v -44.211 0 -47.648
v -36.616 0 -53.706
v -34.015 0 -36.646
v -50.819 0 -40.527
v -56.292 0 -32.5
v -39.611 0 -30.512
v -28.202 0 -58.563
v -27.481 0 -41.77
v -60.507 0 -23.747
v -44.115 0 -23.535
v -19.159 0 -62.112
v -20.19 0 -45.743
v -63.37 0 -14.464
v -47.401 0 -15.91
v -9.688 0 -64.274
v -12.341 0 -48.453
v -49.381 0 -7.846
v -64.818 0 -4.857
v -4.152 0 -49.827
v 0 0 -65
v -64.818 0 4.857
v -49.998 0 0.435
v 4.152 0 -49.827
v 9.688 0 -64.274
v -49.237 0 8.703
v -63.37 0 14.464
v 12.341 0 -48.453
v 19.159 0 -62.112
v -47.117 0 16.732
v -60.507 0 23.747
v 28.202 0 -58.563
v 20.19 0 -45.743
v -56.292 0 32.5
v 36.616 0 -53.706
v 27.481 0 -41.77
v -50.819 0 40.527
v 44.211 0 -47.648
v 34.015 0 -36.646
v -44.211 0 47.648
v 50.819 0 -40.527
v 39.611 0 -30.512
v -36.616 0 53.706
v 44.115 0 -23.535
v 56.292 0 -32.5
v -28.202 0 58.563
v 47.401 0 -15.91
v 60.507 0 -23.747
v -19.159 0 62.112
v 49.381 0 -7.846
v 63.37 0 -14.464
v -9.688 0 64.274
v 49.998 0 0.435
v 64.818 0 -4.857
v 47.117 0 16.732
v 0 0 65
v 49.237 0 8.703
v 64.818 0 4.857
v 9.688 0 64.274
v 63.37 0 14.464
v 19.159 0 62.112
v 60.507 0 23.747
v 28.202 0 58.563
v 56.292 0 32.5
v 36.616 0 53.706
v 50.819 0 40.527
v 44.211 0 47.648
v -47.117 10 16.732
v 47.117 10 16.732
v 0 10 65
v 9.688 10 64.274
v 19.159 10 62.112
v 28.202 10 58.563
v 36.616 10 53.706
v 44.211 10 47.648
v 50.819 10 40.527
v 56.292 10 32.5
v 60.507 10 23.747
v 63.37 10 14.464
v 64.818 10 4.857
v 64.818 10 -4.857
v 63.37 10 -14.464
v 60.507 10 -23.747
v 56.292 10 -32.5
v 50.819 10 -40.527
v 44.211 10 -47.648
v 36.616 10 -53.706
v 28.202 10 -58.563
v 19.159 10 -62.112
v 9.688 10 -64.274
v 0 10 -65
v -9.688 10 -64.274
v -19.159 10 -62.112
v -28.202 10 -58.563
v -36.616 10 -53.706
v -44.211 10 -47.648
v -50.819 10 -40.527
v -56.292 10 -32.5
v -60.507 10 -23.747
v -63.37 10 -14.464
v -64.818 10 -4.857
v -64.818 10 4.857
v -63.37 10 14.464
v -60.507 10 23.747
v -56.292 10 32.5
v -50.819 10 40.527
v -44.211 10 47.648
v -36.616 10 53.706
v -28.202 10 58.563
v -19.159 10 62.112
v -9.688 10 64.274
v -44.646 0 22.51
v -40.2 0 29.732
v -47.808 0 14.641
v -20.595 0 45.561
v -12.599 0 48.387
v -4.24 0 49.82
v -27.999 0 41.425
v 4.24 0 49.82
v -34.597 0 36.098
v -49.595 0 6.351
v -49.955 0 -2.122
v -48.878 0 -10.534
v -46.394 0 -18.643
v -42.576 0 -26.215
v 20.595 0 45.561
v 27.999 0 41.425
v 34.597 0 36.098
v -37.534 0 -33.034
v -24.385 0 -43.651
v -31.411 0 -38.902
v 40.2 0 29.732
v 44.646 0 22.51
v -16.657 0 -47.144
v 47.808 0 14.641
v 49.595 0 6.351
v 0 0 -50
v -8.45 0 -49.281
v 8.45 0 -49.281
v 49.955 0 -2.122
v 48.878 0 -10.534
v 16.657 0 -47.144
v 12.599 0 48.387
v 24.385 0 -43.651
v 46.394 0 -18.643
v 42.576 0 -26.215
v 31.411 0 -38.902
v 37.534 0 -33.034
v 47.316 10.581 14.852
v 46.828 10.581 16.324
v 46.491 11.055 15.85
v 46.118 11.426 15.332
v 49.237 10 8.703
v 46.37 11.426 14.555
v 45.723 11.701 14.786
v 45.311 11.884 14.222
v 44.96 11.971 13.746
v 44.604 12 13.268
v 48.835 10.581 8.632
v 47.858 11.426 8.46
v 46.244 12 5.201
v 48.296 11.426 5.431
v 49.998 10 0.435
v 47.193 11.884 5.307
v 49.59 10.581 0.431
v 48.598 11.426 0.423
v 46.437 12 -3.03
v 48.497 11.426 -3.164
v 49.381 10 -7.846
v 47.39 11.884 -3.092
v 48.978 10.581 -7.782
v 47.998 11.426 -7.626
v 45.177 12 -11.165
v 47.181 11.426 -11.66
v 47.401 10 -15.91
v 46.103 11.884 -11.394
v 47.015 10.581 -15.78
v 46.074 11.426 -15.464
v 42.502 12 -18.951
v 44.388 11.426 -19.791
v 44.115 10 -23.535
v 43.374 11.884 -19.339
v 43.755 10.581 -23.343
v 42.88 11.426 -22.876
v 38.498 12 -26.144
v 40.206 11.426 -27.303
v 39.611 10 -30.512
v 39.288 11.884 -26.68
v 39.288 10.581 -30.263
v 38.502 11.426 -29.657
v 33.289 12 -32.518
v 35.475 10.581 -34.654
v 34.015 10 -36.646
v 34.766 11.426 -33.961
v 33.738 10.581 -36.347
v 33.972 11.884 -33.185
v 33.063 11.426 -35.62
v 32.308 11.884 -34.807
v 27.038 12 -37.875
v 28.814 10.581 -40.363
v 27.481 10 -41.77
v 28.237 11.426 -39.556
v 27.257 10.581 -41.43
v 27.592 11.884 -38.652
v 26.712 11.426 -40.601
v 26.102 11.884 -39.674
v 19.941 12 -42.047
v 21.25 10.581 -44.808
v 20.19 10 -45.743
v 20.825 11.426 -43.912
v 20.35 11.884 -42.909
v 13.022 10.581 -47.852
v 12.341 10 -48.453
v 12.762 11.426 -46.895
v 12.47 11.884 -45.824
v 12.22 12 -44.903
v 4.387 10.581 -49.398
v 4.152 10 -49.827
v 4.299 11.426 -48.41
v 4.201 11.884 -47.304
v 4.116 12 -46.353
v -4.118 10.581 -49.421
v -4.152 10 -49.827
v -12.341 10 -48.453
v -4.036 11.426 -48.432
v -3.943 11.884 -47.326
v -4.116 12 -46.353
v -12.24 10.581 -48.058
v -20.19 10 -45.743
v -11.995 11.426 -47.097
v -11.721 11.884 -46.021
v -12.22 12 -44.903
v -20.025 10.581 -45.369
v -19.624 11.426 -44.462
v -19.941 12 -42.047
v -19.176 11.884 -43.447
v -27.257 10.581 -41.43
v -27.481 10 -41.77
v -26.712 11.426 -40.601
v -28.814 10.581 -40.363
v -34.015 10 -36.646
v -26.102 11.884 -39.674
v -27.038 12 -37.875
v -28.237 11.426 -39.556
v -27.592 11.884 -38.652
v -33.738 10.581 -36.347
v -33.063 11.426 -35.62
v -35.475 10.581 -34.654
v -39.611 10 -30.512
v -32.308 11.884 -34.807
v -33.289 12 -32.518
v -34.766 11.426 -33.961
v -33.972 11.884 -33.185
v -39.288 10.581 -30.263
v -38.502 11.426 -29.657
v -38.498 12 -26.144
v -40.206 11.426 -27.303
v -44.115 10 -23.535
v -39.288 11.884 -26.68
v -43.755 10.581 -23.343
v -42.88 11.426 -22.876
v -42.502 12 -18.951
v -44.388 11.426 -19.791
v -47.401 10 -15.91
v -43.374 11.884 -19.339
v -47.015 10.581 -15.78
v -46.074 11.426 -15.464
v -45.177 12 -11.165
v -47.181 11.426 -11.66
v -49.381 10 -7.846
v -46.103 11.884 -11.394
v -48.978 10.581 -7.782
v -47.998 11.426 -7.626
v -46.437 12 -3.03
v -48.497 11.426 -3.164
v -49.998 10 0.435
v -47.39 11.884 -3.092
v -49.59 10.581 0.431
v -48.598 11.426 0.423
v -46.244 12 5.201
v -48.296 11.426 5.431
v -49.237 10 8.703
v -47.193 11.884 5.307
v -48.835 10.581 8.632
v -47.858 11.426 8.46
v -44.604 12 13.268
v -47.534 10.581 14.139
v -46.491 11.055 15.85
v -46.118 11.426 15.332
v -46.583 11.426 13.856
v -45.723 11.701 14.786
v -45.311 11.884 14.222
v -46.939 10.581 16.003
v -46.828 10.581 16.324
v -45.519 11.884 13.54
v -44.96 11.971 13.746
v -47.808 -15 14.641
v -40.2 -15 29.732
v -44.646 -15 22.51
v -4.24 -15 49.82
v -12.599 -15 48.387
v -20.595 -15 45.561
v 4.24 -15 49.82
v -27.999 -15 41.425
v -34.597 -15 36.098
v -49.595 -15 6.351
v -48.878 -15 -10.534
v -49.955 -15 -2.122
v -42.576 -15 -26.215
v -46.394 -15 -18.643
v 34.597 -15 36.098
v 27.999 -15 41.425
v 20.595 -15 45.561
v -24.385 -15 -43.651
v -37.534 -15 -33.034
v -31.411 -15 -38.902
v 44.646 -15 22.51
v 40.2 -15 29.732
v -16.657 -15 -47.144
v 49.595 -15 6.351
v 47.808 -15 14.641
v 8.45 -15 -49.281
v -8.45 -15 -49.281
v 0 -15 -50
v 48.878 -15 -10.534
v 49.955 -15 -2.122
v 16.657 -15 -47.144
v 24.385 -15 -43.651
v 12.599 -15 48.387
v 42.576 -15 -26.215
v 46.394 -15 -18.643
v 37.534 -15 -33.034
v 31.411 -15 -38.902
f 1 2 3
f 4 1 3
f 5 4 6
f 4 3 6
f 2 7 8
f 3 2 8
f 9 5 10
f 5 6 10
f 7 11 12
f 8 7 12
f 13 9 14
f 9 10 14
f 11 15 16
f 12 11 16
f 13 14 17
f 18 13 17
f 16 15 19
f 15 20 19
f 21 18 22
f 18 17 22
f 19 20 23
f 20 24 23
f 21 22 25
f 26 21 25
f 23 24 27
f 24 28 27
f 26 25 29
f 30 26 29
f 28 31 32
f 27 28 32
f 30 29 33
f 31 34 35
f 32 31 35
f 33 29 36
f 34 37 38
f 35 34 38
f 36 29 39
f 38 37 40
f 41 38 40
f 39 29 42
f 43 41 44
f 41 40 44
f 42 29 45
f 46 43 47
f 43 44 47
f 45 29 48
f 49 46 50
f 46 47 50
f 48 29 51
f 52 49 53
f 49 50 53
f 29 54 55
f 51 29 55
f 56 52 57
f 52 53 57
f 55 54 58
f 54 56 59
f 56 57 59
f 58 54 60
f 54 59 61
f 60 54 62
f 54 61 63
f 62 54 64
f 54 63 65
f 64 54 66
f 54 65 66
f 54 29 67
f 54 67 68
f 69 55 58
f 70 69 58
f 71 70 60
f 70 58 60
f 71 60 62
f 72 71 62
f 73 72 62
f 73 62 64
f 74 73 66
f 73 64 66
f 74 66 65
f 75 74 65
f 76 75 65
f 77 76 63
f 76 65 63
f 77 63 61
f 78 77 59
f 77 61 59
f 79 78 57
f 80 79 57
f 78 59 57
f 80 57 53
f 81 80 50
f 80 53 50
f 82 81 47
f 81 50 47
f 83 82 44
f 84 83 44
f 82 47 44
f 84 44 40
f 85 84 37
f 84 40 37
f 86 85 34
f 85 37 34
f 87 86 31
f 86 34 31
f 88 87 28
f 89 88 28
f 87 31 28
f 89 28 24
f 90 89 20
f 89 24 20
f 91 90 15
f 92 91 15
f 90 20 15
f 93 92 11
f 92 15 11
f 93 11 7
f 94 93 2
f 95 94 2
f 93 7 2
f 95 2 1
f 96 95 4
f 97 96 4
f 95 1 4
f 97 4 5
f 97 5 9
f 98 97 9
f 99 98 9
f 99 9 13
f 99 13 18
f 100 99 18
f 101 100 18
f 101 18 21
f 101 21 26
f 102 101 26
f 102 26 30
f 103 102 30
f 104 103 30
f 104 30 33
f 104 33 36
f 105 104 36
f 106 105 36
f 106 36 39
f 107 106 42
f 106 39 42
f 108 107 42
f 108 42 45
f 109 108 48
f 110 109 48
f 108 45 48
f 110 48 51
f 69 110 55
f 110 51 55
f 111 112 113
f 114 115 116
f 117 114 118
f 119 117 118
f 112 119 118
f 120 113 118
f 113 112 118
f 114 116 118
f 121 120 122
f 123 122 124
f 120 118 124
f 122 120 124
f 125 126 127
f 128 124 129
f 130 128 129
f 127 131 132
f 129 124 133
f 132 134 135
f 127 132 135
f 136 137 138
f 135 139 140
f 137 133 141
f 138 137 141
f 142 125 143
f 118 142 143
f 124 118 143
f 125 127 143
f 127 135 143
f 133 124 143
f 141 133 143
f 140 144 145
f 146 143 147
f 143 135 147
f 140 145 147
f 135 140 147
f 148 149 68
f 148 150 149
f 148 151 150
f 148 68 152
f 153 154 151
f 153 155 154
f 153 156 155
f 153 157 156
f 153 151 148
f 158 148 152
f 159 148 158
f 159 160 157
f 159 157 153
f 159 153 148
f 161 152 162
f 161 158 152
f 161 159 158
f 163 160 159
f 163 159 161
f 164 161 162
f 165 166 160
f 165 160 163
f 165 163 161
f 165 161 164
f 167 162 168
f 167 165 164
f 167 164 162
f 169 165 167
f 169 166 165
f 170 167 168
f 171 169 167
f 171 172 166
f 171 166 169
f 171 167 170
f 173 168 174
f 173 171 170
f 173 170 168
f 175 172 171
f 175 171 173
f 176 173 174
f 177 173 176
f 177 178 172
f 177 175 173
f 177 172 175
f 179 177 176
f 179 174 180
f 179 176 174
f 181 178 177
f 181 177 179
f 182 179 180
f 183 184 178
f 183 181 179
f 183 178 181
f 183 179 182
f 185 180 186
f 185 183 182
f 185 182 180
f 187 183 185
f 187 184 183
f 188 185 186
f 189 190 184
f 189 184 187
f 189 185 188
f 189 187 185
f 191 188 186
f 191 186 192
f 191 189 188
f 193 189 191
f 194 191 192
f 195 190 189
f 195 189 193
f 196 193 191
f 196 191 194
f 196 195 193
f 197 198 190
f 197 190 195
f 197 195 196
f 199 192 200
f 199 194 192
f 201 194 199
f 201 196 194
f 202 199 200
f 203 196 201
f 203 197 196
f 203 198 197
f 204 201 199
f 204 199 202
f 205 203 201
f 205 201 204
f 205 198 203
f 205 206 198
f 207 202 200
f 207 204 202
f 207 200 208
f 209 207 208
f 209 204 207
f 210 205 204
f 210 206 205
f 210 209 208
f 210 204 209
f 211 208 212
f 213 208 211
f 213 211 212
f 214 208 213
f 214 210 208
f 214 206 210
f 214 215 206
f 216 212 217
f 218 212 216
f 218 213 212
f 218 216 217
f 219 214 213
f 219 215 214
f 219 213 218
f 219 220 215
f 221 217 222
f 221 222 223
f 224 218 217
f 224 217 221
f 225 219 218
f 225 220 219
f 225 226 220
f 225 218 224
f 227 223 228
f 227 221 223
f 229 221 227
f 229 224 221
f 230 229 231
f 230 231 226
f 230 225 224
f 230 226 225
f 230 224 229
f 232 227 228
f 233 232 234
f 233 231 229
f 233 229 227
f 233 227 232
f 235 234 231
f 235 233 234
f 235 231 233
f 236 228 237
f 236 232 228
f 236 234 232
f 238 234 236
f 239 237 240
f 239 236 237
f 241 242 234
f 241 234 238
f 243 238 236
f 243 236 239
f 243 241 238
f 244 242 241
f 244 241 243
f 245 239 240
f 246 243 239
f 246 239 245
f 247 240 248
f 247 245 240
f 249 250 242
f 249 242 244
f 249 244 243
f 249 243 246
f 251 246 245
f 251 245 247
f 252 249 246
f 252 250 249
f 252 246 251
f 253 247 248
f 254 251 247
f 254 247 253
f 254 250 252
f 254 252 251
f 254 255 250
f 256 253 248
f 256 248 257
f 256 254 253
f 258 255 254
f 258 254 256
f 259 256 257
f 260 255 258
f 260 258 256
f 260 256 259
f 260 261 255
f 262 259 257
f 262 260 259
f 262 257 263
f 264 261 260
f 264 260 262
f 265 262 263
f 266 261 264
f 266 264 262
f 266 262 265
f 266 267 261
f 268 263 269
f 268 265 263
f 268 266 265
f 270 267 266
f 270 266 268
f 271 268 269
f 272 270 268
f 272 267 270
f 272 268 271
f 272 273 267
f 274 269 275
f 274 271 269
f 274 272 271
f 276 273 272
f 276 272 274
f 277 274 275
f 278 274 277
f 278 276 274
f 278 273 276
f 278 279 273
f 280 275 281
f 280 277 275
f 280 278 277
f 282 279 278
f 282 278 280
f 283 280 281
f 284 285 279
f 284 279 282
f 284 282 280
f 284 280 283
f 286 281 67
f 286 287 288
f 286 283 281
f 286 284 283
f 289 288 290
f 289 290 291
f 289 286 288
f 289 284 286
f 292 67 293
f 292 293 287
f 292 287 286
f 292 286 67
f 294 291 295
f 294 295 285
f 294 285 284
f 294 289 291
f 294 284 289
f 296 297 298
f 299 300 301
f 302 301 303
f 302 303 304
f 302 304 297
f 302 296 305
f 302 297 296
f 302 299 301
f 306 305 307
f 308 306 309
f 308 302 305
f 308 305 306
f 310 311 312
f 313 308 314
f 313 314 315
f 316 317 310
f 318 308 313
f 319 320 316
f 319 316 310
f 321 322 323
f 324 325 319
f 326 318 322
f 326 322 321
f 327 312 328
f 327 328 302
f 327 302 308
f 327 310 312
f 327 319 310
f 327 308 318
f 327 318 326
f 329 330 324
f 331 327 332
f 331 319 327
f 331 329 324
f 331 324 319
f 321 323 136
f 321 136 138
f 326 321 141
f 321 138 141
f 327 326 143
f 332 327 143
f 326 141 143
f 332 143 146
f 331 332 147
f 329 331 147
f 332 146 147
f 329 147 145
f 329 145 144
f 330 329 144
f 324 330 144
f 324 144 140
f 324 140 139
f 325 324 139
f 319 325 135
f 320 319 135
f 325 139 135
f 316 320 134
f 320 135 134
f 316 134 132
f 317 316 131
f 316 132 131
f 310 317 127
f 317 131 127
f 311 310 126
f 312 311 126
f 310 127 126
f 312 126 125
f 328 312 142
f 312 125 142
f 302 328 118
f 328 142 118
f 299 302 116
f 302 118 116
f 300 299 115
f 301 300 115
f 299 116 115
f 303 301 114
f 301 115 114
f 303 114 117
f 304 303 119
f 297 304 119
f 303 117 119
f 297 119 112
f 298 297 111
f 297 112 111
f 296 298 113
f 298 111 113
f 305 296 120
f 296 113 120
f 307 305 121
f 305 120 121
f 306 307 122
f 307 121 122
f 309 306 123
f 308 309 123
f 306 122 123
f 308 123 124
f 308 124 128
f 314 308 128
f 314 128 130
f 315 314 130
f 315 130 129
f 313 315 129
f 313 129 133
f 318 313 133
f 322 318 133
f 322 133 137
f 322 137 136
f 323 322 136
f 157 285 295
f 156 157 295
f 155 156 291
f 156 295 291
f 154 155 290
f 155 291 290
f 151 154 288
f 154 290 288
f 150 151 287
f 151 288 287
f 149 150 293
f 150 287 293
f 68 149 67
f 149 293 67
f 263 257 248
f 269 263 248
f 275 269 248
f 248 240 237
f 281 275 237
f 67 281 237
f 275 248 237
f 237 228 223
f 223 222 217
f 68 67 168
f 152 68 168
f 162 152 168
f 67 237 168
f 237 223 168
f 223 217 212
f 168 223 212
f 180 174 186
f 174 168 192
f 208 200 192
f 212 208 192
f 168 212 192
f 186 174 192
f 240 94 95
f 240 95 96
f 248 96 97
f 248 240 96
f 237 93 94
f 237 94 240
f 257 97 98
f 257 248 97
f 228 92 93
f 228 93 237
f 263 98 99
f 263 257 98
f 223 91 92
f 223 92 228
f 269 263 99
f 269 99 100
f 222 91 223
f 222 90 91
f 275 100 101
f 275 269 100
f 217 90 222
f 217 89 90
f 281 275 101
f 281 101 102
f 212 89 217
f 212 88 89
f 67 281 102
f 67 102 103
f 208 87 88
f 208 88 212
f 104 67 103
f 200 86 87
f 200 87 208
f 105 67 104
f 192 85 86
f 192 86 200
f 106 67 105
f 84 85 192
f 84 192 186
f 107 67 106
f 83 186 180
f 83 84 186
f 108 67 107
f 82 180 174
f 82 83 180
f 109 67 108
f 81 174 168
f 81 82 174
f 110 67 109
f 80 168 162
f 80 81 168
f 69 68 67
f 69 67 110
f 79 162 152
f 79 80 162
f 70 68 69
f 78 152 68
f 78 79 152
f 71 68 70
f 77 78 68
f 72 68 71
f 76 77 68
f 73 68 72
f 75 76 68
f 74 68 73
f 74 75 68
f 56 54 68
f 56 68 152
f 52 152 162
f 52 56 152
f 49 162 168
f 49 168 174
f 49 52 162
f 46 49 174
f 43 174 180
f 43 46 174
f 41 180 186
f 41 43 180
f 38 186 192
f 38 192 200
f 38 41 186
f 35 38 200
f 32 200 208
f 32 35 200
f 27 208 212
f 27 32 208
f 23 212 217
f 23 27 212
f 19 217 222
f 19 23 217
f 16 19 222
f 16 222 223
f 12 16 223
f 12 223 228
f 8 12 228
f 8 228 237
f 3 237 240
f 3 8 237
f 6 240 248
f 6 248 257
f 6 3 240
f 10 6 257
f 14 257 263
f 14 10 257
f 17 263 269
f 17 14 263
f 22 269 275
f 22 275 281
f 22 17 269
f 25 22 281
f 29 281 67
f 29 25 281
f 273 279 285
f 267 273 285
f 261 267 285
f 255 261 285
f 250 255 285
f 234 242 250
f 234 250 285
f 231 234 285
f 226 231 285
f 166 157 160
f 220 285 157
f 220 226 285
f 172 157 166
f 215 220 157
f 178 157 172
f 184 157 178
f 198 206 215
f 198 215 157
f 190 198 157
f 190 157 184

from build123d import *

# Parameters (mm, degrees)
SKETCH1_R           = 65
BOSS_EXTRUDE1_DEPTH = 10
BOSS_EXTRUDE2_DEPTH = 2
FILLET1_R           = 4
SKETCH3_R           = 50
BOSS_EXTRUDE8_DEPTH = 15


with BuildPart() as part:
    # Sketch1 → Boss-Extrude1 (new body)
    with BuildSketch(Plane(origin=(0, 0, 0), x_dir=(1, 0, 0), z_dir=(0, 1, 0))):
        with Locations(Location((0, 0, 0), (0, 0, 270))):
            Circle(SKETCH1_R)
        with BuildLine():
            Line((-47.117303386, -16.731996941), (47.117303386, -16.731996941))
            ThreePointArc((47.117303386, -16.731996941), (0, 50), (-47.117303386, -16.731996941))
        make_face(mode=Mode.SUBTRACT)
    extrude(amount=BOSS_EXTRUDE1_DEPTH)


with BuildPart() as body_2:
    # Sketch2 → Boss-Extrude2 (new body)
    with BuildSketch(Plane(origin=(0, 10, 0), x_dir=(1, 0, 0), z_dir=(0, 1, 0))):
        with BuildLine():
            Line((-47.117303386, -16.731996941), (47.117303386, -16.731996941))
            ThreePointArc((47.117303386, -16.731996941), (0, 50), (-47.117303386, -16.731996941))
        make_face()
    extrude(amount=BOSS_EXTRUDE2_DEPTH)

    # Fillet1
    # the kernel refuses this fillet: 4 mm, written as the material it takes off along each edge
    with BuildSketch(Plane(origin=(-55.777557424, 12, 16.731996941), x_dir=(0, -1, 0), z_dir=(1, 0, 0))) as fillet1_piece_1:
        with BuildLine():
            CenterArc((4, 3.464101615), FILLET1_R, 180, 60)
            Line((0, 3.464101615), (-0.08, 3.464101615))
            Line((-0.08, 3.464101615), (-0.08, 0))
            Line((-0.08, 0), (0, -0.08))
            ThreePointArc((0, -0.08), (1, -0.08), (1.96, -0.069282032))
            Line((1.96, -0.069282032), (2, 0))
        make_face()
    extrude(amount=111.555114848, mode=Mode.SUBTRACT)
    with BuildSketch(Plane(origin=(0, 12, 0), x_dir=(0.8703709621505415, 0, 0.49239657619152943), z_dir=(-0.49239657619152943, 0, 0.8703709621505415))) as fillet1_piece_2:
        with BuildLine():
            CenterArc((46.535898385, -4), FILLET1_R, 30, 60)
            Line((46.535898385, 0), (46.535898385, 0.08))
            Line((46.535898385, 0.08), (50, 0.08))
            Line((50, 0.08), (50.08, 0))
            ThreePointArc((50.08, 0), (50.08, -1), (50.069282032, -1.96))
            Line((50.069282032, -1.96), (50, -2))
        make_face()
    revolve(axis=Axis((0, 12, 0), (0, 1, 0)), revolution_arc=238.996447313, mode=Mode.SUBTRACT)


with BuildPart() as body_3:
    # Sketch3 → Boss-Extrude8 (new body)
    with BuildSketch(Plane.XZ):
        with Locations(Location((0, 0, 0), (0, 0, 270))):
            Circle(SKETCH3_R)
    extrude(amount=BOSS_EXTRUDE8_DEPTH)


solid = Compound([part.part, body_2.part, body_3.part])
